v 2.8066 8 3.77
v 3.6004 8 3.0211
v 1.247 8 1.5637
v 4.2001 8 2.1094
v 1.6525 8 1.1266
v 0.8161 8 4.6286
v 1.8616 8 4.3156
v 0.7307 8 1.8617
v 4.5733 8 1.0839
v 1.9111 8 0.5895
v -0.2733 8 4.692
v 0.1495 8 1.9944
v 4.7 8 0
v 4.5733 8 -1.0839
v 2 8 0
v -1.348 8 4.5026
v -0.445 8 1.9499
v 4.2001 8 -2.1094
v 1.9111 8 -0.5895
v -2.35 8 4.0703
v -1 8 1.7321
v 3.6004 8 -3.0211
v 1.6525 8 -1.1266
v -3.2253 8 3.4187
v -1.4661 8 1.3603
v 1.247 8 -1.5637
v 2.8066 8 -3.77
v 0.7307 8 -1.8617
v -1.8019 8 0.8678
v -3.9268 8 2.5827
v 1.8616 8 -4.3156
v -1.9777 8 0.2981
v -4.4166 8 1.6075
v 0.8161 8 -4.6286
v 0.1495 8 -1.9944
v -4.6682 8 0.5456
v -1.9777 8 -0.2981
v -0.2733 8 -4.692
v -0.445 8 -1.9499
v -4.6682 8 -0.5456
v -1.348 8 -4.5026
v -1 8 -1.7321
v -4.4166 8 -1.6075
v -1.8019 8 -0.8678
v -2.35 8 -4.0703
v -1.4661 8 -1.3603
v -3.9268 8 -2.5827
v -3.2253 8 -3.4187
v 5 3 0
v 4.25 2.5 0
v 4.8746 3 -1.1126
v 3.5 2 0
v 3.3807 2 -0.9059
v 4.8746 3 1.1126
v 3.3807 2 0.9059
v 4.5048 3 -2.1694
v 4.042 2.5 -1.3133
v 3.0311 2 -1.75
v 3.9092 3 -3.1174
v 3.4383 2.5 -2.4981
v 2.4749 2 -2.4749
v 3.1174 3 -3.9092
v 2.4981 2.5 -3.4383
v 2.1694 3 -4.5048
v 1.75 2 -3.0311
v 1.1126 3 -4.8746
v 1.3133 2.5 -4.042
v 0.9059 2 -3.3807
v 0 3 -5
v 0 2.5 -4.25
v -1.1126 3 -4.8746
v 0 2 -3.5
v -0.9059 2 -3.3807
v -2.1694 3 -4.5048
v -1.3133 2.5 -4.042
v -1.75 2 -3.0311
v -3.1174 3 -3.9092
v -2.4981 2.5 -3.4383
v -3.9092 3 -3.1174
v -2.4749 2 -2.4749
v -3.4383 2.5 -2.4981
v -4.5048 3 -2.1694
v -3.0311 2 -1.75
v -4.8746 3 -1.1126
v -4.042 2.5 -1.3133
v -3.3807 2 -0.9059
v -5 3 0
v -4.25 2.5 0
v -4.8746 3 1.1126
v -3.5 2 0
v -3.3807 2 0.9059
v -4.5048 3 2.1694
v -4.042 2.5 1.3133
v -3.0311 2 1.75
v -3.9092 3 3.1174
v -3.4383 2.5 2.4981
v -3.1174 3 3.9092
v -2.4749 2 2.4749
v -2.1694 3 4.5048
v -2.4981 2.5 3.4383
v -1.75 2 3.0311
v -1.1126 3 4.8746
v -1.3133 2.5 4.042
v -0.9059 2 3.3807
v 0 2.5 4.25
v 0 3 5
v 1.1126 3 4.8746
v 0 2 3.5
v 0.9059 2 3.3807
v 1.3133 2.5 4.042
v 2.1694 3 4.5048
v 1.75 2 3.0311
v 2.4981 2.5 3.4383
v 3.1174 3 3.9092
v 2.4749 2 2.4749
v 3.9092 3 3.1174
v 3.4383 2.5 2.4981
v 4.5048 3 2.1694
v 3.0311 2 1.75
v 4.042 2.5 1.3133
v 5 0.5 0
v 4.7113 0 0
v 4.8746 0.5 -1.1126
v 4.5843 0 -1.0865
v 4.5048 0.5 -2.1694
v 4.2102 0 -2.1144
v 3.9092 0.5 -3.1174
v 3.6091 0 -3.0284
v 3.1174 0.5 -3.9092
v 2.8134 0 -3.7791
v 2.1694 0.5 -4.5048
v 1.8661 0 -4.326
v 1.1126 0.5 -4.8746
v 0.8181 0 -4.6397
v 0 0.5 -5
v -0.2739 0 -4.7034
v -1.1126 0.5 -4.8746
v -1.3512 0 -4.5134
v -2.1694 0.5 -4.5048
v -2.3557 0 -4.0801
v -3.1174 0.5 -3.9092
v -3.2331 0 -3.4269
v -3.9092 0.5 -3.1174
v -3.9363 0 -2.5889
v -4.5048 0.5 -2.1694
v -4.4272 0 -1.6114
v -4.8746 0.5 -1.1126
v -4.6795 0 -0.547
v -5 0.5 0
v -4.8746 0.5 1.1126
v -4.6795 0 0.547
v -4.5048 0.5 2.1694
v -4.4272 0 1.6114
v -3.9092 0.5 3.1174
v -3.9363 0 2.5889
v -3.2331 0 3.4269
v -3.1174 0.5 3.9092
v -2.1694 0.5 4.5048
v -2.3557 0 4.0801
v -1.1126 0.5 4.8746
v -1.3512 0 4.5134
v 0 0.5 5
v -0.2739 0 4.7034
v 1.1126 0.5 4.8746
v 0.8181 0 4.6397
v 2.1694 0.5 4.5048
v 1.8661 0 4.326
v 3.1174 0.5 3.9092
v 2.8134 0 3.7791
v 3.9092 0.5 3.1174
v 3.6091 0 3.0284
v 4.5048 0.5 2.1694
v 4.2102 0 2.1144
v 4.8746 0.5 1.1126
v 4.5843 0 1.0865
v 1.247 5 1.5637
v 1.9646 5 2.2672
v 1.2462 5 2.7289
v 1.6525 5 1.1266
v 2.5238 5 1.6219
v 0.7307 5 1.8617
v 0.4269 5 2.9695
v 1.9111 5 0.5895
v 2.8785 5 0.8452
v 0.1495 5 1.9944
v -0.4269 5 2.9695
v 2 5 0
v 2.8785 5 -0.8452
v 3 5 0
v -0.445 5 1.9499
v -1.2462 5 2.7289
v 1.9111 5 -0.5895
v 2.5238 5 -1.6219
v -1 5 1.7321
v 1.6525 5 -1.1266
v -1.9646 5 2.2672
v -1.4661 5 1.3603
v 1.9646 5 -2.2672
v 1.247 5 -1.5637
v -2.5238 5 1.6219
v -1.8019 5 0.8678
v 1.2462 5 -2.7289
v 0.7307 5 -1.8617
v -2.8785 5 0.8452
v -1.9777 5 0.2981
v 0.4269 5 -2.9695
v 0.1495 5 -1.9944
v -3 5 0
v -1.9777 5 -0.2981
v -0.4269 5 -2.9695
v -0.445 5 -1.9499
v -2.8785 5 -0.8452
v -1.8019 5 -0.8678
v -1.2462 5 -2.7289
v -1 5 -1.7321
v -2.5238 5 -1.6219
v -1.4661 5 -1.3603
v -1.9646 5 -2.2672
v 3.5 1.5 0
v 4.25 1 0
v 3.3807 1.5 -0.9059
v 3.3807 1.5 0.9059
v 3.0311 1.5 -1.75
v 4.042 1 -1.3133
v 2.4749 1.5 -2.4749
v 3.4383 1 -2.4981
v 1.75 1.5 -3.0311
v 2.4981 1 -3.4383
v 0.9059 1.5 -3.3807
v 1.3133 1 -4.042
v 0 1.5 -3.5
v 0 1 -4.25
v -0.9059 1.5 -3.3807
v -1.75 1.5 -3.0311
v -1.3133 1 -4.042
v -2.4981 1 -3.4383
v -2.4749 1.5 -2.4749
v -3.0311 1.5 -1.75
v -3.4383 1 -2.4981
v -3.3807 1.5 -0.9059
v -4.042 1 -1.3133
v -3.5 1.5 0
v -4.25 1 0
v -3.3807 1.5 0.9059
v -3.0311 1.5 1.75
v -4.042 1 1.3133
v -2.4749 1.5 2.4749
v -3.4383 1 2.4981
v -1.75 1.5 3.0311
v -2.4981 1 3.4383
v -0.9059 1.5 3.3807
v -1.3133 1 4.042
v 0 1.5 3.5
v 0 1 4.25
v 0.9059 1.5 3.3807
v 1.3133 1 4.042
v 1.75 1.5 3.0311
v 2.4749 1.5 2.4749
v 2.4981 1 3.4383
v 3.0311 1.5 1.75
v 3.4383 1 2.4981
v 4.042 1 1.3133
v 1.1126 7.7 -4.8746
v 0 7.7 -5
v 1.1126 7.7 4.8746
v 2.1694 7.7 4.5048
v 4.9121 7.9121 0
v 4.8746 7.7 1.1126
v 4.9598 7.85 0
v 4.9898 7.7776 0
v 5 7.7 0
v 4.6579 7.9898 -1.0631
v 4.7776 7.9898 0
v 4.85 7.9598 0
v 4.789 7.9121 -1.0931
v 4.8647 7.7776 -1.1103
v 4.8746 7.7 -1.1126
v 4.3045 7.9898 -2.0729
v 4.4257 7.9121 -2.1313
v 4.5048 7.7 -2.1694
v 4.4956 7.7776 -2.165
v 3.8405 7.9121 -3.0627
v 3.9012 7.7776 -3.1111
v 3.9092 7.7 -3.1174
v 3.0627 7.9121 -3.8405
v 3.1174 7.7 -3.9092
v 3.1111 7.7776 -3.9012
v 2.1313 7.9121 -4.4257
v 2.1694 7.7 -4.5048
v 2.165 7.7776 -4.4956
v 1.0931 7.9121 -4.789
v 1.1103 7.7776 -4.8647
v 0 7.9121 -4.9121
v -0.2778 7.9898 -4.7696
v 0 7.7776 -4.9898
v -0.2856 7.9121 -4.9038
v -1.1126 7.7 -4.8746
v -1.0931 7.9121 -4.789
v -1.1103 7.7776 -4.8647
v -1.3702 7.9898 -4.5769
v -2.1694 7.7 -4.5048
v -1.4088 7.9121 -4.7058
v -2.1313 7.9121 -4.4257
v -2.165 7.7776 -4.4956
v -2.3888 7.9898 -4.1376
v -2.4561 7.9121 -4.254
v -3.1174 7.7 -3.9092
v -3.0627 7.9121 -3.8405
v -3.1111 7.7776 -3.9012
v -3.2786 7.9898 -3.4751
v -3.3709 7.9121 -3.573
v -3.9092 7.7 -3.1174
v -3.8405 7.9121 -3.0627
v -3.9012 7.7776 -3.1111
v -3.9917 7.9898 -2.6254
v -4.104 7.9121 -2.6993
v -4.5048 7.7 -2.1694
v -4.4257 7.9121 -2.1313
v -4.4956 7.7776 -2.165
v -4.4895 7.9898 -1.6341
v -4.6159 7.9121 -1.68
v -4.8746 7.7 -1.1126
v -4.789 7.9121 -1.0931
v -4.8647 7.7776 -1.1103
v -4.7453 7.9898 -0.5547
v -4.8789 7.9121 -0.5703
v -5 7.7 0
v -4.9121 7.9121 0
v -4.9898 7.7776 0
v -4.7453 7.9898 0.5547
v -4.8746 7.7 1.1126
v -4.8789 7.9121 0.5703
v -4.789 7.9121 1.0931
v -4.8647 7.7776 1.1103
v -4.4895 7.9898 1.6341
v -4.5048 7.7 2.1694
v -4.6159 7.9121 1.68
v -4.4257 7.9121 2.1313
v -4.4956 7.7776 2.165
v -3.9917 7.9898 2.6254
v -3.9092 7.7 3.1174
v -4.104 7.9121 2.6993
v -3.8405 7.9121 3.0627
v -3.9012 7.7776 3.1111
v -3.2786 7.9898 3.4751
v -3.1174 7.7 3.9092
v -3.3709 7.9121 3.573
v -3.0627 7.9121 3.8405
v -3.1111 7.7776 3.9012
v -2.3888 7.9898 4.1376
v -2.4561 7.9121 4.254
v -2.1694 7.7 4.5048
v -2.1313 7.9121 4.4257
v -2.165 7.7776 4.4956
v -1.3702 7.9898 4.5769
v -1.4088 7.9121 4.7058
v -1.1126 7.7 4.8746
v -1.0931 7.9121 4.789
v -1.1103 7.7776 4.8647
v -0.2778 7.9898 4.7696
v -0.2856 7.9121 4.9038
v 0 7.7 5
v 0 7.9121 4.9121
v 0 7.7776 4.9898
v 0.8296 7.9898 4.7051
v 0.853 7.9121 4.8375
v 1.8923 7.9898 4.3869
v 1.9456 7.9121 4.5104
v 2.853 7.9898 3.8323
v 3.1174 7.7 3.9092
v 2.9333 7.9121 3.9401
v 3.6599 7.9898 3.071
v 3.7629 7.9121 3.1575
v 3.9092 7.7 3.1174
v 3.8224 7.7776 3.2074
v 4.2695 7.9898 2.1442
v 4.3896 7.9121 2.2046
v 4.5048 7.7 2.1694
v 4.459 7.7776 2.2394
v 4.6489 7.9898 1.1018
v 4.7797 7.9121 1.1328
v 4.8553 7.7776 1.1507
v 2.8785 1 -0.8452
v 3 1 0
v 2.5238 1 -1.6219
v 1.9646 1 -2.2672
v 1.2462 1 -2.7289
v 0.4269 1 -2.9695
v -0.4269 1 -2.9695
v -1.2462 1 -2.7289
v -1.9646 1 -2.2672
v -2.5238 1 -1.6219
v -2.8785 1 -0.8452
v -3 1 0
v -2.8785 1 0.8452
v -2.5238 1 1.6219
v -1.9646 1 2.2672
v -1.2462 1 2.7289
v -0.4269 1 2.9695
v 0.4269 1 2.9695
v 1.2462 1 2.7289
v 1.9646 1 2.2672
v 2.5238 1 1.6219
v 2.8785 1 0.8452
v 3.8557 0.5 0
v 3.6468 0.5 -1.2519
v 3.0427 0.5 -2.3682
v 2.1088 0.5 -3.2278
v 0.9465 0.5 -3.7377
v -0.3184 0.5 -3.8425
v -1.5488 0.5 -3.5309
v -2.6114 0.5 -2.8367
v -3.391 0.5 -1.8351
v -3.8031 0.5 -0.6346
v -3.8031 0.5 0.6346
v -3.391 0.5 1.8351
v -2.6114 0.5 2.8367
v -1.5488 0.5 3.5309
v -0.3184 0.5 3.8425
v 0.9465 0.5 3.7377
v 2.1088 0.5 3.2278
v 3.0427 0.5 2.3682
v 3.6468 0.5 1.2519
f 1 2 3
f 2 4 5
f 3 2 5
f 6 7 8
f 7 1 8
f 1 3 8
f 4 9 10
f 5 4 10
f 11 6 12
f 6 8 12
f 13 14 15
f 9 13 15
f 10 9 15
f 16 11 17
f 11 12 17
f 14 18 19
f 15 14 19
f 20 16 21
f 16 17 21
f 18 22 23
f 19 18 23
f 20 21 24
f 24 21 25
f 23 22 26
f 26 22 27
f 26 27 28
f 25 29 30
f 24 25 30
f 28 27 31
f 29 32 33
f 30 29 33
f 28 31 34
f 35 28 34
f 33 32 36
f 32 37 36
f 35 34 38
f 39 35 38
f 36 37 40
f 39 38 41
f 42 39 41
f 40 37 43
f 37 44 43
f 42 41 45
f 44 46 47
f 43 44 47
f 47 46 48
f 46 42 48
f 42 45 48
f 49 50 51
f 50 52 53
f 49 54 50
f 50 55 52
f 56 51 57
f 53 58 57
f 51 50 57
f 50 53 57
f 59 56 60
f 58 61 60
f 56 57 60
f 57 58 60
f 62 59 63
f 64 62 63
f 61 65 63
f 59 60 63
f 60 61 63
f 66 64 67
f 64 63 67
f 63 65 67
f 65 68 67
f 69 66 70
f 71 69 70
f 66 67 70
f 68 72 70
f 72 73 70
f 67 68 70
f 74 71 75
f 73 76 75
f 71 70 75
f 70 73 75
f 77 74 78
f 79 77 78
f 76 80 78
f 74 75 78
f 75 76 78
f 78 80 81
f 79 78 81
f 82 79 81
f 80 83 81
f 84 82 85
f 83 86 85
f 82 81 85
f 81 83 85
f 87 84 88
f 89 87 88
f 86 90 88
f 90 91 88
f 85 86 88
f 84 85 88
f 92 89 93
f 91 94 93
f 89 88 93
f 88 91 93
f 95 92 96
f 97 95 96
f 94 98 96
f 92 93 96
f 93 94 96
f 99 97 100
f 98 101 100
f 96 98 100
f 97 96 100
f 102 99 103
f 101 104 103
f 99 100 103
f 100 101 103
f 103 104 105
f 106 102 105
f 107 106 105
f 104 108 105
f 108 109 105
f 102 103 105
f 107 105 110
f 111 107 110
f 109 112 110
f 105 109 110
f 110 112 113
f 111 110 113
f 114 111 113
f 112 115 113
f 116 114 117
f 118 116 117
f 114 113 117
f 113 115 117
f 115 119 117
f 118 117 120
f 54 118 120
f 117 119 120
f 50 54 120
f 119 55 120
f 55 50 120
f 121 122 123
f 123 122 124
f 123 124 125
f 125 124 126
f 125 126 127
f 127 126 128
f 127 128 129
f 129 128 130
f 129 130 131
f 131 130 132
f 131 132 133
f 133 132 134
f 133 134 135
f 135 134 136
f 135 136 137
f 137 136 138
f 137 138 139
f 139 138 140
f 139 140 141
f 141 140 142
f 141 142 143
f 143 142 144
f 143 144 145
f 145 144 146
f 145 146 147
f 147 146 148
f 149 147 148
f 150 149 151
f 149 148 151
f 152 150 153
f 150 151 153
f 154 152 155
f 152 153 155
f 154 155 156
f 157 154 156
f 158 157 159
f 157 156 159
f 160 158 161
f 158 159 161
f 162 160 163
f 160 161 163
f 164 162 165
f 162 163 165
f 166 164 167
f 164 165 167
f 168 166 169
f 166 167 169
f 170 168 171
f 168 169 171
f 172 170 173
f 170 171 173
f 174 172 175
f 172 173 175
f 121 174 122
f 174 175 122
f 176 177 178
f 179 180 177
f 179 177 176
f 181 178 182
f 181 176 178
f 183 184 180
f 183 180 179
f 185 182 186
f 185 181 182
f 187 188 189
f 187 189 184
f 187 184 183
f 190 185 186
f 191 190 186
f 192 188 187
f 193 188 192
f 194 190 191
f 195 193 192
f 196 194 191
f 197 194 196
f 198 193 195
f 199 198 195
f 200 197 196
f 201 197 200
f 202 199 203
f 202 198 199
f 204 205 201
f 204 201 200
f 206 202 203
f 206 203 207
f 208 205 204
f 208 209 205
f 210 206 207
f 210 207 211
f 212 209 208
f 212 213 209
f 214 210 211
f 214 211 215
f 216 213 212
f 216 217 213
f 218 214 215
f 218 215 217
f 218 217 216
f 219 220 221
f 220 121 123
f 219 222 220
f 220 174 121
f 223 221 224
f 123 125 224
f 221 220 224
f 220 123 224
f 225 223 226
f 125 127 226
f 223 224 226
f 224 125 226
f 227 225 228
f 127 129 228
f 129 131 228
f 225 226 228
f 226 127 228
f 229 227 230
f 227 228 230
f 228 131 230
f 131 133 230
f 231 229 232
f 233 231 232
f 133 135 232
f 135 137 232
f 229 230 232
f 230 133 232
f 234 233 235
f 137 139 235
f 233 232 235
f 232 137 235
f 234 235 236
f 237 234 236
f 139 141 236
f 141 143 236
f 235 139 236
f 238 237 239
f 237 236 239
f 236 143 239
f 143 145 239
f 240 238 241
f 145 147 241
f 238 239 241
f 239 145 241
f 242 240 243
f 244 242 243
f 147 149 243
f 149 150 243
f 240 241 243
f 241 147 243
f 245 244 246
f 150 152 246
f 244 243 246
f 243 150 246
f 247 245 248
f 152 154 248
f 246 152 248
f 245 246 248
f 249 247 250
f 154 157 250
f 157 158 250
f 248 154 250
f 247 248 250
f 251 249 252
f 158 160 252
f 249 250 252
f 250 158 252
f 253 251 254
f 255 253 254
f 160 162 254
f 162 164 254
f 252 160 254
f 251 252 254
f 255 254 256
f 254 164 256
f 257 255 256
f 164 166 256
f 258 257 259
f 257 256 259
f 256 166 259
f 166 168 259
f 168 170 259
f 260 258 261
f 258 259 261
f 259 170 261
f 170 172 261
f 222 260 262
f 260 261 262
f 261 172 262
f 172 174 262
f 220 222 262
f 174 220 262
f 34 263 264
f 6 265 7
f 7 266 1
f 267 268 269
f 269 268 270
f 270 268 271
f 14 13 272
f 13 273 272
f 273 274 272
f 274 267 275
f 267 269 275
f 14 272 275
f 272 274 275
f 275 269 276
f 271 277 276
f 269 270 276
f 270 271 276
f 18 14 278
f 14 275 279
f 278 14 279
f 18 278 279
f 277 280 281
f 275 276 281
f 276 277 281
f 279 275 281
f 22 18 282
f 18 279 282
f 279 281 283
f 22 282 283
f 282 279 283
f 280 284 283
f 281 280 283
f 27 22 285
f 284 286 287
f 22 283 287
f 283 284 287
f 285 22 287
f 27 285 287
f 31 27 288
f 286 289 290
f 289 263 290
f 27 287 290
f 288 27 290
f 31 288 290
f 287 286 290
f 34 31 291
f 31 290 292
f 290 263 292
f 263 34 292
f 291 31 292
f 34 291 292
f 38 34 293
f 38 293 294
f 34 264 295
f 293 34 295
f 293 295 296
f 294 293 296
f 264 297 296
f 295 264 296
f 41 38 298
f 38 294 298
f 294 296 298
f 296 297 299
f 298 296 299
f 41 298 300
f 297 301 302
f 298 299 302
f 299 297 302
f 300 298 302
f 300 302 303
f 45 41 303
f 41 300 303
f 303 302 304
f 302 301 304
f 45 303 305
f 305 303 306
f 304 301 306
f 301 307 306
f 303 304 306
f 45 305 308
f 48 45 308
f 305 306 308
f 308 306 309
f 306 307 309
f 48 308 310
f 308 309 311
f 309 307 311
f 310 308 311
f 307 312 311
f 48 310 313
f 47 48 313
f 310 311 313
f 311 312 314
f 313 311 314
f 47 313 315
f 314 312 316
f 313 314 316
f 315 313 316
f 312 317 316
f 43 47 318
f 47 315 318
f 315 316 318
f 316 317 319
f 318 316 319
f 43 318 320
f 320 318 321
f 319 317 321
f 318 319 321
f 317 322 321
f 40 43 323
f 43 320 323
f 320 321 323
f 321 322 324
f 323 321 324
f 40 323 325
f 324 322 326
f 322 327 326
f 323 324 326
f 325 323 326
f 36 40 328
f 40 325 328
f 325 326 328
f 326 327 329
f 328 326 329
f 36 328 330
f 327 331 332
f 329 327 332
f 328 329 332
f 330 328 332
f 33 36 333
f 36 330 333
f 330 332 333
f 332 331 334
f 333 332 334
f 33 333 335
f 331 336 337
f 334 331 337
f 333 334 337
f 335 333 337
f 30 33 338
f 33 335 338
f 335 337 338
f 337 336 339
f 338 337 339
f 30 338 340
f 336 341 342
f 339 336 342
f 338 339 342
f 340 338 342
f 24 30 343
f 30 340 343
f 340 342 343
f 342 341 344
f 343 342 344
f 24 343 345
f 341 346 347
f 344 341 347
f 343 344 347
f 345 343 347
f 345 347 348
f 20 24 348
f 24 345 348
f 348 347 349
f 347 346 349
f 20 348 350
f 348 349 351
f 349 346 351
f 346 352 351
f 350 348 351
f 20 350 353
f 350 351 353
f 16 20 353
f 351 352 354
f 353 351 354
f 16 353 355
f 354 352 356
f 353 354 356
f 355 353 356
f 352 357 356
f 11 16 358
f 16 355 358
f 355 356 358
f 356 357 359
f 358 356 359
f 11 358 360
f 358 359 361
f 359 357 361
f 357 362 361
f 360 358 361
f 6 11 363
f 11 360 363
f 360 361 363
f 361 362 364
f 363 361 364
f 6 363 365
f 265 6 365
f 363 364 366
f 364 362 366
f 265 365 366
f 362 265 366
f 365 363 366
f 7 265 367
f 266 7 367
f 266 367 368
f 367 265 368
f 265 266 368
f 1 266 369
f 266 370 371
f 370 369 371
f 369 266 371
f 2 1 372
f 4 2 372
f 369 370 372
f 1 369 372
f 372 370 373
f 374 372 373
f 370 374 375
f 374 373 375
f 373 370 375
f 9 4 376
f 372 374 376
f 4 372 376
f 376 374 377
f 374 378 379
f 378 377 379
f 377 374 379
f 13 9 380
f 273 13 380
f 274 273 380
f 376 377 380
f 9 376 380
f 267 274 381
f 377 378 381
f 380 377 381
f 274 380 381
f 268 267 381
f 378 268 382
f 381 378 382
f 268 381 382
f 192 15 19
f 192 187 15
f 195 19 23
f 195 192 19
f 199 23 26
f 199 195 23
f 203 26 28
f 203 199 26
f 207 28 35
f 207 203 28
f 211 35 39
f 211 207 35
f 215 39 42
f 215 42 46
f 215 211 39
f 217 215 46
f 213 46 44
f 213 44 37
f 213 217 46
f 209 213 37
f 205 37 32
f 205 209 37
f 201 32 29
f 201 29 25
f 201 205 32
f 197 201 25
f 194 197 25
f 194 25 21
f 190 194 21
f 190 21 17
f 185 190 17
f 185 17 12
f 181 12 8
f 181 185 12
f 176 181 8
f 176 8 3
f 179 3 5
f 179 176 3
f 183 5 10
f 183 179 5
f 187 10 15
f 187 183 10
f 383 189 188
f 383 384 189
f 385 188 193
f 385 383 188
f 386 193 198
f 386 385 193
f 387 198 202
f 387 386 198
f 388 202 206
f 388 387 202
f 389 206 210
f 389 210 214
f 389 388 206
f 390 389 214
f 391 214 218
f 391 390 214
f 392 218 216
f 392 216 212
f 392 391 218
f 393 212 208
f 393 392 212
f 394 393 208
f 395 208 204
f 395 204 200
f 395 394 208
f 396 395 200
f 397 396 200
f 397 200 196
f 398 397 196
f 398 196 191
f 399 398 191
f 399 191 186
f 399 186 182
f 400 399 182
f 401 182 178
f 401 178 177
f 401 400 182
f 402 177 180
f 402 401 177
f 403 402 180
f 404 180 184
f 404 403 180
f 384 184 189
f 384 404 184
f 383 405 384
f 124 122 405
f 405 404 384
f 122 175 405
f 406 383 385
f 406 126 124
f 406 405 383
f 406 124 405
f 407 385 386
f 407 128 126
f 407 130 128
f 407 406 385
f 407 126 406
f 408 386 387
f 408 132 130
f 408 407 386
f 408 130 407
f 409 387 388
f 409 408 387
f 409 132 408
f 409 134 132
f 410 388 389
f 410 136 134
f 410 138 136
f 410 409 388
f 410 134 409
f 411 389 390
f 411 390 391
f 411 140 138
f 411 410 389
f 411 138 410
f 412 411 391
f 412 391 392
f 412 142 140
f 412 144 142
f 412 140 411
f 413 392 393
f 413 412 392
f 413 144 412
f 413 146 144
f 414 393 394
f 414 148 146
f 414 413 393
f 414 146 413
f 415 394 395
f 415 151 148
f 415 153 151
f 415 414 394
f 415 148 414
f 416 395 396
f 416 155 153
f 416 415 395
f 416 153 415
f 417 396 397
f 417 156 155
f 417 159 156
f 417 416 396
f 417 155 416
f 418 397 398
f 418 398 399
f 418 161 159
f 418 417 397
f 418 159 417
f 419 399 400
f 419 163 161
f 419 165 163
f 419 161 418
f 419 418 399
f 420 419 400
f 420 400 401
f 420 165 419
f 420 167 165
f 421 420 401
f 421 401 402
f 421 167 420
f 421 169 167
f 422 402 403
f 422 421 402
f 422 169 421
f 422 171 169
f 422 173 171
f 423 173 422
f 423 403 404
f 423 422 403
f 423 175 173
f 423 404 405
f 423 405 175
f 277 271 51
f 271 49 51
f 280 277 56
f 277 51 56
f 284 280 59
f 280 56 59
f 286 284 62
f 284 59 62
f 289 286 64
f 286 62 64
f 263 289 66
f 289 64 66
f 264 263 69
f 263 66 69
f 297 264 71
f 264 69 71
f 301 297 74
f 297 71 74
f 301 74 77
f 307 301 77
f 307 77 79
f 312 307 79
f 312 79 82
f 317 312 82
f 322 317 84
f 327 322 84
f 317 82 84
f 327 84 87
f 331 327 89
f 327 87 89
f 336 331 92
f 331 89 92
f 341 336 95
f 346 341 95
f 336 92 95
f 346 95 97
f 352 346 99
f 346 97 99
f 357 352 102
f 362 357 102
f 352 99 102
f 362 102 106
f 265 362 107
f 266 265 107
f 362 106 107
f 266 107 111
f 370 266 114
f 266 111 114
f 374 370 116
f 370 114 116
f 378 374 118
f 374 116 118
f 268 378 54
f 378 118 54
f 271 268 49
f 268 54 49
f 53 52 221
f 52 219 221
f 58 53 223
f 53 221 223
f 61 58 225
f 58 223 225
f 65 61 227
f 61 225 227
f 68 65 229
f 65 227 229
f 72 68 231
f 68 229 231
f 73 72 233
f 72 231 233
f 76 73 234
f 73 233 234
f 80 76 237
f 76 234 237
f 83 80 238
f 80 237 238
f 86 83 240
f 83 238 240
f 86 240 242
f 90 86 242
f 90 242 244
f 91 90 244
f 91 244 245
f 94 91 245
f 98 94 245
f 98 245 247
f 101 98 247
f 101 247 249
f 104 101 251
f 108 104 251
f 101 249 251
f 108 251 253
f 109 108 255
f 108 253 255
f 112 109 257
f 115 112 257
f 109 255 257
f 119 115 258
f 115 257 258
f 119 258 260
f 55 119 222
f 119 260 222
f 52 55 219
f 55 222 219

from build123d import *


with BuildPart() as part:
    # Sketch1 → Revolve1 (revolve)
    with BuildSketch(Plane.XY):
        with BuildLine():
            Line((0, 8), (4.7, 8))
            ThreePointArc((4.7, 8), (4.912132034, 7.912132034), (5, 7.7))
            Line((5, 7.7), (5, 3))
            Line((5, 3), (3.5, 2))
            Line((3.5, 2), (3.5, 1.5))
            Line((3.5, 1.5), (5, 0.5))
            Line((5, 0.5), (4.711324865, 0))
            Line((4.711324865, 0), (0, 0))
            Line((0, 0), (0, 8))
        make_face()
    revolve(axis=Axis((0, 0, 0), (0, 1, 0)))

    # Sketch2 → Cut-Revolve1 (revolve, cut)
    with BuildSketch(Plane.XY):
        Polygon((0, 8), (2, 8), (2, 5), (3, 5), (3, 1), (4.711324865, 0), (0, 0), align=None)
    revolve(axis=Axis((0, 0, 0), (0, 1, 0)), mode=Mode.SUBTRACT)


solid = part.part
